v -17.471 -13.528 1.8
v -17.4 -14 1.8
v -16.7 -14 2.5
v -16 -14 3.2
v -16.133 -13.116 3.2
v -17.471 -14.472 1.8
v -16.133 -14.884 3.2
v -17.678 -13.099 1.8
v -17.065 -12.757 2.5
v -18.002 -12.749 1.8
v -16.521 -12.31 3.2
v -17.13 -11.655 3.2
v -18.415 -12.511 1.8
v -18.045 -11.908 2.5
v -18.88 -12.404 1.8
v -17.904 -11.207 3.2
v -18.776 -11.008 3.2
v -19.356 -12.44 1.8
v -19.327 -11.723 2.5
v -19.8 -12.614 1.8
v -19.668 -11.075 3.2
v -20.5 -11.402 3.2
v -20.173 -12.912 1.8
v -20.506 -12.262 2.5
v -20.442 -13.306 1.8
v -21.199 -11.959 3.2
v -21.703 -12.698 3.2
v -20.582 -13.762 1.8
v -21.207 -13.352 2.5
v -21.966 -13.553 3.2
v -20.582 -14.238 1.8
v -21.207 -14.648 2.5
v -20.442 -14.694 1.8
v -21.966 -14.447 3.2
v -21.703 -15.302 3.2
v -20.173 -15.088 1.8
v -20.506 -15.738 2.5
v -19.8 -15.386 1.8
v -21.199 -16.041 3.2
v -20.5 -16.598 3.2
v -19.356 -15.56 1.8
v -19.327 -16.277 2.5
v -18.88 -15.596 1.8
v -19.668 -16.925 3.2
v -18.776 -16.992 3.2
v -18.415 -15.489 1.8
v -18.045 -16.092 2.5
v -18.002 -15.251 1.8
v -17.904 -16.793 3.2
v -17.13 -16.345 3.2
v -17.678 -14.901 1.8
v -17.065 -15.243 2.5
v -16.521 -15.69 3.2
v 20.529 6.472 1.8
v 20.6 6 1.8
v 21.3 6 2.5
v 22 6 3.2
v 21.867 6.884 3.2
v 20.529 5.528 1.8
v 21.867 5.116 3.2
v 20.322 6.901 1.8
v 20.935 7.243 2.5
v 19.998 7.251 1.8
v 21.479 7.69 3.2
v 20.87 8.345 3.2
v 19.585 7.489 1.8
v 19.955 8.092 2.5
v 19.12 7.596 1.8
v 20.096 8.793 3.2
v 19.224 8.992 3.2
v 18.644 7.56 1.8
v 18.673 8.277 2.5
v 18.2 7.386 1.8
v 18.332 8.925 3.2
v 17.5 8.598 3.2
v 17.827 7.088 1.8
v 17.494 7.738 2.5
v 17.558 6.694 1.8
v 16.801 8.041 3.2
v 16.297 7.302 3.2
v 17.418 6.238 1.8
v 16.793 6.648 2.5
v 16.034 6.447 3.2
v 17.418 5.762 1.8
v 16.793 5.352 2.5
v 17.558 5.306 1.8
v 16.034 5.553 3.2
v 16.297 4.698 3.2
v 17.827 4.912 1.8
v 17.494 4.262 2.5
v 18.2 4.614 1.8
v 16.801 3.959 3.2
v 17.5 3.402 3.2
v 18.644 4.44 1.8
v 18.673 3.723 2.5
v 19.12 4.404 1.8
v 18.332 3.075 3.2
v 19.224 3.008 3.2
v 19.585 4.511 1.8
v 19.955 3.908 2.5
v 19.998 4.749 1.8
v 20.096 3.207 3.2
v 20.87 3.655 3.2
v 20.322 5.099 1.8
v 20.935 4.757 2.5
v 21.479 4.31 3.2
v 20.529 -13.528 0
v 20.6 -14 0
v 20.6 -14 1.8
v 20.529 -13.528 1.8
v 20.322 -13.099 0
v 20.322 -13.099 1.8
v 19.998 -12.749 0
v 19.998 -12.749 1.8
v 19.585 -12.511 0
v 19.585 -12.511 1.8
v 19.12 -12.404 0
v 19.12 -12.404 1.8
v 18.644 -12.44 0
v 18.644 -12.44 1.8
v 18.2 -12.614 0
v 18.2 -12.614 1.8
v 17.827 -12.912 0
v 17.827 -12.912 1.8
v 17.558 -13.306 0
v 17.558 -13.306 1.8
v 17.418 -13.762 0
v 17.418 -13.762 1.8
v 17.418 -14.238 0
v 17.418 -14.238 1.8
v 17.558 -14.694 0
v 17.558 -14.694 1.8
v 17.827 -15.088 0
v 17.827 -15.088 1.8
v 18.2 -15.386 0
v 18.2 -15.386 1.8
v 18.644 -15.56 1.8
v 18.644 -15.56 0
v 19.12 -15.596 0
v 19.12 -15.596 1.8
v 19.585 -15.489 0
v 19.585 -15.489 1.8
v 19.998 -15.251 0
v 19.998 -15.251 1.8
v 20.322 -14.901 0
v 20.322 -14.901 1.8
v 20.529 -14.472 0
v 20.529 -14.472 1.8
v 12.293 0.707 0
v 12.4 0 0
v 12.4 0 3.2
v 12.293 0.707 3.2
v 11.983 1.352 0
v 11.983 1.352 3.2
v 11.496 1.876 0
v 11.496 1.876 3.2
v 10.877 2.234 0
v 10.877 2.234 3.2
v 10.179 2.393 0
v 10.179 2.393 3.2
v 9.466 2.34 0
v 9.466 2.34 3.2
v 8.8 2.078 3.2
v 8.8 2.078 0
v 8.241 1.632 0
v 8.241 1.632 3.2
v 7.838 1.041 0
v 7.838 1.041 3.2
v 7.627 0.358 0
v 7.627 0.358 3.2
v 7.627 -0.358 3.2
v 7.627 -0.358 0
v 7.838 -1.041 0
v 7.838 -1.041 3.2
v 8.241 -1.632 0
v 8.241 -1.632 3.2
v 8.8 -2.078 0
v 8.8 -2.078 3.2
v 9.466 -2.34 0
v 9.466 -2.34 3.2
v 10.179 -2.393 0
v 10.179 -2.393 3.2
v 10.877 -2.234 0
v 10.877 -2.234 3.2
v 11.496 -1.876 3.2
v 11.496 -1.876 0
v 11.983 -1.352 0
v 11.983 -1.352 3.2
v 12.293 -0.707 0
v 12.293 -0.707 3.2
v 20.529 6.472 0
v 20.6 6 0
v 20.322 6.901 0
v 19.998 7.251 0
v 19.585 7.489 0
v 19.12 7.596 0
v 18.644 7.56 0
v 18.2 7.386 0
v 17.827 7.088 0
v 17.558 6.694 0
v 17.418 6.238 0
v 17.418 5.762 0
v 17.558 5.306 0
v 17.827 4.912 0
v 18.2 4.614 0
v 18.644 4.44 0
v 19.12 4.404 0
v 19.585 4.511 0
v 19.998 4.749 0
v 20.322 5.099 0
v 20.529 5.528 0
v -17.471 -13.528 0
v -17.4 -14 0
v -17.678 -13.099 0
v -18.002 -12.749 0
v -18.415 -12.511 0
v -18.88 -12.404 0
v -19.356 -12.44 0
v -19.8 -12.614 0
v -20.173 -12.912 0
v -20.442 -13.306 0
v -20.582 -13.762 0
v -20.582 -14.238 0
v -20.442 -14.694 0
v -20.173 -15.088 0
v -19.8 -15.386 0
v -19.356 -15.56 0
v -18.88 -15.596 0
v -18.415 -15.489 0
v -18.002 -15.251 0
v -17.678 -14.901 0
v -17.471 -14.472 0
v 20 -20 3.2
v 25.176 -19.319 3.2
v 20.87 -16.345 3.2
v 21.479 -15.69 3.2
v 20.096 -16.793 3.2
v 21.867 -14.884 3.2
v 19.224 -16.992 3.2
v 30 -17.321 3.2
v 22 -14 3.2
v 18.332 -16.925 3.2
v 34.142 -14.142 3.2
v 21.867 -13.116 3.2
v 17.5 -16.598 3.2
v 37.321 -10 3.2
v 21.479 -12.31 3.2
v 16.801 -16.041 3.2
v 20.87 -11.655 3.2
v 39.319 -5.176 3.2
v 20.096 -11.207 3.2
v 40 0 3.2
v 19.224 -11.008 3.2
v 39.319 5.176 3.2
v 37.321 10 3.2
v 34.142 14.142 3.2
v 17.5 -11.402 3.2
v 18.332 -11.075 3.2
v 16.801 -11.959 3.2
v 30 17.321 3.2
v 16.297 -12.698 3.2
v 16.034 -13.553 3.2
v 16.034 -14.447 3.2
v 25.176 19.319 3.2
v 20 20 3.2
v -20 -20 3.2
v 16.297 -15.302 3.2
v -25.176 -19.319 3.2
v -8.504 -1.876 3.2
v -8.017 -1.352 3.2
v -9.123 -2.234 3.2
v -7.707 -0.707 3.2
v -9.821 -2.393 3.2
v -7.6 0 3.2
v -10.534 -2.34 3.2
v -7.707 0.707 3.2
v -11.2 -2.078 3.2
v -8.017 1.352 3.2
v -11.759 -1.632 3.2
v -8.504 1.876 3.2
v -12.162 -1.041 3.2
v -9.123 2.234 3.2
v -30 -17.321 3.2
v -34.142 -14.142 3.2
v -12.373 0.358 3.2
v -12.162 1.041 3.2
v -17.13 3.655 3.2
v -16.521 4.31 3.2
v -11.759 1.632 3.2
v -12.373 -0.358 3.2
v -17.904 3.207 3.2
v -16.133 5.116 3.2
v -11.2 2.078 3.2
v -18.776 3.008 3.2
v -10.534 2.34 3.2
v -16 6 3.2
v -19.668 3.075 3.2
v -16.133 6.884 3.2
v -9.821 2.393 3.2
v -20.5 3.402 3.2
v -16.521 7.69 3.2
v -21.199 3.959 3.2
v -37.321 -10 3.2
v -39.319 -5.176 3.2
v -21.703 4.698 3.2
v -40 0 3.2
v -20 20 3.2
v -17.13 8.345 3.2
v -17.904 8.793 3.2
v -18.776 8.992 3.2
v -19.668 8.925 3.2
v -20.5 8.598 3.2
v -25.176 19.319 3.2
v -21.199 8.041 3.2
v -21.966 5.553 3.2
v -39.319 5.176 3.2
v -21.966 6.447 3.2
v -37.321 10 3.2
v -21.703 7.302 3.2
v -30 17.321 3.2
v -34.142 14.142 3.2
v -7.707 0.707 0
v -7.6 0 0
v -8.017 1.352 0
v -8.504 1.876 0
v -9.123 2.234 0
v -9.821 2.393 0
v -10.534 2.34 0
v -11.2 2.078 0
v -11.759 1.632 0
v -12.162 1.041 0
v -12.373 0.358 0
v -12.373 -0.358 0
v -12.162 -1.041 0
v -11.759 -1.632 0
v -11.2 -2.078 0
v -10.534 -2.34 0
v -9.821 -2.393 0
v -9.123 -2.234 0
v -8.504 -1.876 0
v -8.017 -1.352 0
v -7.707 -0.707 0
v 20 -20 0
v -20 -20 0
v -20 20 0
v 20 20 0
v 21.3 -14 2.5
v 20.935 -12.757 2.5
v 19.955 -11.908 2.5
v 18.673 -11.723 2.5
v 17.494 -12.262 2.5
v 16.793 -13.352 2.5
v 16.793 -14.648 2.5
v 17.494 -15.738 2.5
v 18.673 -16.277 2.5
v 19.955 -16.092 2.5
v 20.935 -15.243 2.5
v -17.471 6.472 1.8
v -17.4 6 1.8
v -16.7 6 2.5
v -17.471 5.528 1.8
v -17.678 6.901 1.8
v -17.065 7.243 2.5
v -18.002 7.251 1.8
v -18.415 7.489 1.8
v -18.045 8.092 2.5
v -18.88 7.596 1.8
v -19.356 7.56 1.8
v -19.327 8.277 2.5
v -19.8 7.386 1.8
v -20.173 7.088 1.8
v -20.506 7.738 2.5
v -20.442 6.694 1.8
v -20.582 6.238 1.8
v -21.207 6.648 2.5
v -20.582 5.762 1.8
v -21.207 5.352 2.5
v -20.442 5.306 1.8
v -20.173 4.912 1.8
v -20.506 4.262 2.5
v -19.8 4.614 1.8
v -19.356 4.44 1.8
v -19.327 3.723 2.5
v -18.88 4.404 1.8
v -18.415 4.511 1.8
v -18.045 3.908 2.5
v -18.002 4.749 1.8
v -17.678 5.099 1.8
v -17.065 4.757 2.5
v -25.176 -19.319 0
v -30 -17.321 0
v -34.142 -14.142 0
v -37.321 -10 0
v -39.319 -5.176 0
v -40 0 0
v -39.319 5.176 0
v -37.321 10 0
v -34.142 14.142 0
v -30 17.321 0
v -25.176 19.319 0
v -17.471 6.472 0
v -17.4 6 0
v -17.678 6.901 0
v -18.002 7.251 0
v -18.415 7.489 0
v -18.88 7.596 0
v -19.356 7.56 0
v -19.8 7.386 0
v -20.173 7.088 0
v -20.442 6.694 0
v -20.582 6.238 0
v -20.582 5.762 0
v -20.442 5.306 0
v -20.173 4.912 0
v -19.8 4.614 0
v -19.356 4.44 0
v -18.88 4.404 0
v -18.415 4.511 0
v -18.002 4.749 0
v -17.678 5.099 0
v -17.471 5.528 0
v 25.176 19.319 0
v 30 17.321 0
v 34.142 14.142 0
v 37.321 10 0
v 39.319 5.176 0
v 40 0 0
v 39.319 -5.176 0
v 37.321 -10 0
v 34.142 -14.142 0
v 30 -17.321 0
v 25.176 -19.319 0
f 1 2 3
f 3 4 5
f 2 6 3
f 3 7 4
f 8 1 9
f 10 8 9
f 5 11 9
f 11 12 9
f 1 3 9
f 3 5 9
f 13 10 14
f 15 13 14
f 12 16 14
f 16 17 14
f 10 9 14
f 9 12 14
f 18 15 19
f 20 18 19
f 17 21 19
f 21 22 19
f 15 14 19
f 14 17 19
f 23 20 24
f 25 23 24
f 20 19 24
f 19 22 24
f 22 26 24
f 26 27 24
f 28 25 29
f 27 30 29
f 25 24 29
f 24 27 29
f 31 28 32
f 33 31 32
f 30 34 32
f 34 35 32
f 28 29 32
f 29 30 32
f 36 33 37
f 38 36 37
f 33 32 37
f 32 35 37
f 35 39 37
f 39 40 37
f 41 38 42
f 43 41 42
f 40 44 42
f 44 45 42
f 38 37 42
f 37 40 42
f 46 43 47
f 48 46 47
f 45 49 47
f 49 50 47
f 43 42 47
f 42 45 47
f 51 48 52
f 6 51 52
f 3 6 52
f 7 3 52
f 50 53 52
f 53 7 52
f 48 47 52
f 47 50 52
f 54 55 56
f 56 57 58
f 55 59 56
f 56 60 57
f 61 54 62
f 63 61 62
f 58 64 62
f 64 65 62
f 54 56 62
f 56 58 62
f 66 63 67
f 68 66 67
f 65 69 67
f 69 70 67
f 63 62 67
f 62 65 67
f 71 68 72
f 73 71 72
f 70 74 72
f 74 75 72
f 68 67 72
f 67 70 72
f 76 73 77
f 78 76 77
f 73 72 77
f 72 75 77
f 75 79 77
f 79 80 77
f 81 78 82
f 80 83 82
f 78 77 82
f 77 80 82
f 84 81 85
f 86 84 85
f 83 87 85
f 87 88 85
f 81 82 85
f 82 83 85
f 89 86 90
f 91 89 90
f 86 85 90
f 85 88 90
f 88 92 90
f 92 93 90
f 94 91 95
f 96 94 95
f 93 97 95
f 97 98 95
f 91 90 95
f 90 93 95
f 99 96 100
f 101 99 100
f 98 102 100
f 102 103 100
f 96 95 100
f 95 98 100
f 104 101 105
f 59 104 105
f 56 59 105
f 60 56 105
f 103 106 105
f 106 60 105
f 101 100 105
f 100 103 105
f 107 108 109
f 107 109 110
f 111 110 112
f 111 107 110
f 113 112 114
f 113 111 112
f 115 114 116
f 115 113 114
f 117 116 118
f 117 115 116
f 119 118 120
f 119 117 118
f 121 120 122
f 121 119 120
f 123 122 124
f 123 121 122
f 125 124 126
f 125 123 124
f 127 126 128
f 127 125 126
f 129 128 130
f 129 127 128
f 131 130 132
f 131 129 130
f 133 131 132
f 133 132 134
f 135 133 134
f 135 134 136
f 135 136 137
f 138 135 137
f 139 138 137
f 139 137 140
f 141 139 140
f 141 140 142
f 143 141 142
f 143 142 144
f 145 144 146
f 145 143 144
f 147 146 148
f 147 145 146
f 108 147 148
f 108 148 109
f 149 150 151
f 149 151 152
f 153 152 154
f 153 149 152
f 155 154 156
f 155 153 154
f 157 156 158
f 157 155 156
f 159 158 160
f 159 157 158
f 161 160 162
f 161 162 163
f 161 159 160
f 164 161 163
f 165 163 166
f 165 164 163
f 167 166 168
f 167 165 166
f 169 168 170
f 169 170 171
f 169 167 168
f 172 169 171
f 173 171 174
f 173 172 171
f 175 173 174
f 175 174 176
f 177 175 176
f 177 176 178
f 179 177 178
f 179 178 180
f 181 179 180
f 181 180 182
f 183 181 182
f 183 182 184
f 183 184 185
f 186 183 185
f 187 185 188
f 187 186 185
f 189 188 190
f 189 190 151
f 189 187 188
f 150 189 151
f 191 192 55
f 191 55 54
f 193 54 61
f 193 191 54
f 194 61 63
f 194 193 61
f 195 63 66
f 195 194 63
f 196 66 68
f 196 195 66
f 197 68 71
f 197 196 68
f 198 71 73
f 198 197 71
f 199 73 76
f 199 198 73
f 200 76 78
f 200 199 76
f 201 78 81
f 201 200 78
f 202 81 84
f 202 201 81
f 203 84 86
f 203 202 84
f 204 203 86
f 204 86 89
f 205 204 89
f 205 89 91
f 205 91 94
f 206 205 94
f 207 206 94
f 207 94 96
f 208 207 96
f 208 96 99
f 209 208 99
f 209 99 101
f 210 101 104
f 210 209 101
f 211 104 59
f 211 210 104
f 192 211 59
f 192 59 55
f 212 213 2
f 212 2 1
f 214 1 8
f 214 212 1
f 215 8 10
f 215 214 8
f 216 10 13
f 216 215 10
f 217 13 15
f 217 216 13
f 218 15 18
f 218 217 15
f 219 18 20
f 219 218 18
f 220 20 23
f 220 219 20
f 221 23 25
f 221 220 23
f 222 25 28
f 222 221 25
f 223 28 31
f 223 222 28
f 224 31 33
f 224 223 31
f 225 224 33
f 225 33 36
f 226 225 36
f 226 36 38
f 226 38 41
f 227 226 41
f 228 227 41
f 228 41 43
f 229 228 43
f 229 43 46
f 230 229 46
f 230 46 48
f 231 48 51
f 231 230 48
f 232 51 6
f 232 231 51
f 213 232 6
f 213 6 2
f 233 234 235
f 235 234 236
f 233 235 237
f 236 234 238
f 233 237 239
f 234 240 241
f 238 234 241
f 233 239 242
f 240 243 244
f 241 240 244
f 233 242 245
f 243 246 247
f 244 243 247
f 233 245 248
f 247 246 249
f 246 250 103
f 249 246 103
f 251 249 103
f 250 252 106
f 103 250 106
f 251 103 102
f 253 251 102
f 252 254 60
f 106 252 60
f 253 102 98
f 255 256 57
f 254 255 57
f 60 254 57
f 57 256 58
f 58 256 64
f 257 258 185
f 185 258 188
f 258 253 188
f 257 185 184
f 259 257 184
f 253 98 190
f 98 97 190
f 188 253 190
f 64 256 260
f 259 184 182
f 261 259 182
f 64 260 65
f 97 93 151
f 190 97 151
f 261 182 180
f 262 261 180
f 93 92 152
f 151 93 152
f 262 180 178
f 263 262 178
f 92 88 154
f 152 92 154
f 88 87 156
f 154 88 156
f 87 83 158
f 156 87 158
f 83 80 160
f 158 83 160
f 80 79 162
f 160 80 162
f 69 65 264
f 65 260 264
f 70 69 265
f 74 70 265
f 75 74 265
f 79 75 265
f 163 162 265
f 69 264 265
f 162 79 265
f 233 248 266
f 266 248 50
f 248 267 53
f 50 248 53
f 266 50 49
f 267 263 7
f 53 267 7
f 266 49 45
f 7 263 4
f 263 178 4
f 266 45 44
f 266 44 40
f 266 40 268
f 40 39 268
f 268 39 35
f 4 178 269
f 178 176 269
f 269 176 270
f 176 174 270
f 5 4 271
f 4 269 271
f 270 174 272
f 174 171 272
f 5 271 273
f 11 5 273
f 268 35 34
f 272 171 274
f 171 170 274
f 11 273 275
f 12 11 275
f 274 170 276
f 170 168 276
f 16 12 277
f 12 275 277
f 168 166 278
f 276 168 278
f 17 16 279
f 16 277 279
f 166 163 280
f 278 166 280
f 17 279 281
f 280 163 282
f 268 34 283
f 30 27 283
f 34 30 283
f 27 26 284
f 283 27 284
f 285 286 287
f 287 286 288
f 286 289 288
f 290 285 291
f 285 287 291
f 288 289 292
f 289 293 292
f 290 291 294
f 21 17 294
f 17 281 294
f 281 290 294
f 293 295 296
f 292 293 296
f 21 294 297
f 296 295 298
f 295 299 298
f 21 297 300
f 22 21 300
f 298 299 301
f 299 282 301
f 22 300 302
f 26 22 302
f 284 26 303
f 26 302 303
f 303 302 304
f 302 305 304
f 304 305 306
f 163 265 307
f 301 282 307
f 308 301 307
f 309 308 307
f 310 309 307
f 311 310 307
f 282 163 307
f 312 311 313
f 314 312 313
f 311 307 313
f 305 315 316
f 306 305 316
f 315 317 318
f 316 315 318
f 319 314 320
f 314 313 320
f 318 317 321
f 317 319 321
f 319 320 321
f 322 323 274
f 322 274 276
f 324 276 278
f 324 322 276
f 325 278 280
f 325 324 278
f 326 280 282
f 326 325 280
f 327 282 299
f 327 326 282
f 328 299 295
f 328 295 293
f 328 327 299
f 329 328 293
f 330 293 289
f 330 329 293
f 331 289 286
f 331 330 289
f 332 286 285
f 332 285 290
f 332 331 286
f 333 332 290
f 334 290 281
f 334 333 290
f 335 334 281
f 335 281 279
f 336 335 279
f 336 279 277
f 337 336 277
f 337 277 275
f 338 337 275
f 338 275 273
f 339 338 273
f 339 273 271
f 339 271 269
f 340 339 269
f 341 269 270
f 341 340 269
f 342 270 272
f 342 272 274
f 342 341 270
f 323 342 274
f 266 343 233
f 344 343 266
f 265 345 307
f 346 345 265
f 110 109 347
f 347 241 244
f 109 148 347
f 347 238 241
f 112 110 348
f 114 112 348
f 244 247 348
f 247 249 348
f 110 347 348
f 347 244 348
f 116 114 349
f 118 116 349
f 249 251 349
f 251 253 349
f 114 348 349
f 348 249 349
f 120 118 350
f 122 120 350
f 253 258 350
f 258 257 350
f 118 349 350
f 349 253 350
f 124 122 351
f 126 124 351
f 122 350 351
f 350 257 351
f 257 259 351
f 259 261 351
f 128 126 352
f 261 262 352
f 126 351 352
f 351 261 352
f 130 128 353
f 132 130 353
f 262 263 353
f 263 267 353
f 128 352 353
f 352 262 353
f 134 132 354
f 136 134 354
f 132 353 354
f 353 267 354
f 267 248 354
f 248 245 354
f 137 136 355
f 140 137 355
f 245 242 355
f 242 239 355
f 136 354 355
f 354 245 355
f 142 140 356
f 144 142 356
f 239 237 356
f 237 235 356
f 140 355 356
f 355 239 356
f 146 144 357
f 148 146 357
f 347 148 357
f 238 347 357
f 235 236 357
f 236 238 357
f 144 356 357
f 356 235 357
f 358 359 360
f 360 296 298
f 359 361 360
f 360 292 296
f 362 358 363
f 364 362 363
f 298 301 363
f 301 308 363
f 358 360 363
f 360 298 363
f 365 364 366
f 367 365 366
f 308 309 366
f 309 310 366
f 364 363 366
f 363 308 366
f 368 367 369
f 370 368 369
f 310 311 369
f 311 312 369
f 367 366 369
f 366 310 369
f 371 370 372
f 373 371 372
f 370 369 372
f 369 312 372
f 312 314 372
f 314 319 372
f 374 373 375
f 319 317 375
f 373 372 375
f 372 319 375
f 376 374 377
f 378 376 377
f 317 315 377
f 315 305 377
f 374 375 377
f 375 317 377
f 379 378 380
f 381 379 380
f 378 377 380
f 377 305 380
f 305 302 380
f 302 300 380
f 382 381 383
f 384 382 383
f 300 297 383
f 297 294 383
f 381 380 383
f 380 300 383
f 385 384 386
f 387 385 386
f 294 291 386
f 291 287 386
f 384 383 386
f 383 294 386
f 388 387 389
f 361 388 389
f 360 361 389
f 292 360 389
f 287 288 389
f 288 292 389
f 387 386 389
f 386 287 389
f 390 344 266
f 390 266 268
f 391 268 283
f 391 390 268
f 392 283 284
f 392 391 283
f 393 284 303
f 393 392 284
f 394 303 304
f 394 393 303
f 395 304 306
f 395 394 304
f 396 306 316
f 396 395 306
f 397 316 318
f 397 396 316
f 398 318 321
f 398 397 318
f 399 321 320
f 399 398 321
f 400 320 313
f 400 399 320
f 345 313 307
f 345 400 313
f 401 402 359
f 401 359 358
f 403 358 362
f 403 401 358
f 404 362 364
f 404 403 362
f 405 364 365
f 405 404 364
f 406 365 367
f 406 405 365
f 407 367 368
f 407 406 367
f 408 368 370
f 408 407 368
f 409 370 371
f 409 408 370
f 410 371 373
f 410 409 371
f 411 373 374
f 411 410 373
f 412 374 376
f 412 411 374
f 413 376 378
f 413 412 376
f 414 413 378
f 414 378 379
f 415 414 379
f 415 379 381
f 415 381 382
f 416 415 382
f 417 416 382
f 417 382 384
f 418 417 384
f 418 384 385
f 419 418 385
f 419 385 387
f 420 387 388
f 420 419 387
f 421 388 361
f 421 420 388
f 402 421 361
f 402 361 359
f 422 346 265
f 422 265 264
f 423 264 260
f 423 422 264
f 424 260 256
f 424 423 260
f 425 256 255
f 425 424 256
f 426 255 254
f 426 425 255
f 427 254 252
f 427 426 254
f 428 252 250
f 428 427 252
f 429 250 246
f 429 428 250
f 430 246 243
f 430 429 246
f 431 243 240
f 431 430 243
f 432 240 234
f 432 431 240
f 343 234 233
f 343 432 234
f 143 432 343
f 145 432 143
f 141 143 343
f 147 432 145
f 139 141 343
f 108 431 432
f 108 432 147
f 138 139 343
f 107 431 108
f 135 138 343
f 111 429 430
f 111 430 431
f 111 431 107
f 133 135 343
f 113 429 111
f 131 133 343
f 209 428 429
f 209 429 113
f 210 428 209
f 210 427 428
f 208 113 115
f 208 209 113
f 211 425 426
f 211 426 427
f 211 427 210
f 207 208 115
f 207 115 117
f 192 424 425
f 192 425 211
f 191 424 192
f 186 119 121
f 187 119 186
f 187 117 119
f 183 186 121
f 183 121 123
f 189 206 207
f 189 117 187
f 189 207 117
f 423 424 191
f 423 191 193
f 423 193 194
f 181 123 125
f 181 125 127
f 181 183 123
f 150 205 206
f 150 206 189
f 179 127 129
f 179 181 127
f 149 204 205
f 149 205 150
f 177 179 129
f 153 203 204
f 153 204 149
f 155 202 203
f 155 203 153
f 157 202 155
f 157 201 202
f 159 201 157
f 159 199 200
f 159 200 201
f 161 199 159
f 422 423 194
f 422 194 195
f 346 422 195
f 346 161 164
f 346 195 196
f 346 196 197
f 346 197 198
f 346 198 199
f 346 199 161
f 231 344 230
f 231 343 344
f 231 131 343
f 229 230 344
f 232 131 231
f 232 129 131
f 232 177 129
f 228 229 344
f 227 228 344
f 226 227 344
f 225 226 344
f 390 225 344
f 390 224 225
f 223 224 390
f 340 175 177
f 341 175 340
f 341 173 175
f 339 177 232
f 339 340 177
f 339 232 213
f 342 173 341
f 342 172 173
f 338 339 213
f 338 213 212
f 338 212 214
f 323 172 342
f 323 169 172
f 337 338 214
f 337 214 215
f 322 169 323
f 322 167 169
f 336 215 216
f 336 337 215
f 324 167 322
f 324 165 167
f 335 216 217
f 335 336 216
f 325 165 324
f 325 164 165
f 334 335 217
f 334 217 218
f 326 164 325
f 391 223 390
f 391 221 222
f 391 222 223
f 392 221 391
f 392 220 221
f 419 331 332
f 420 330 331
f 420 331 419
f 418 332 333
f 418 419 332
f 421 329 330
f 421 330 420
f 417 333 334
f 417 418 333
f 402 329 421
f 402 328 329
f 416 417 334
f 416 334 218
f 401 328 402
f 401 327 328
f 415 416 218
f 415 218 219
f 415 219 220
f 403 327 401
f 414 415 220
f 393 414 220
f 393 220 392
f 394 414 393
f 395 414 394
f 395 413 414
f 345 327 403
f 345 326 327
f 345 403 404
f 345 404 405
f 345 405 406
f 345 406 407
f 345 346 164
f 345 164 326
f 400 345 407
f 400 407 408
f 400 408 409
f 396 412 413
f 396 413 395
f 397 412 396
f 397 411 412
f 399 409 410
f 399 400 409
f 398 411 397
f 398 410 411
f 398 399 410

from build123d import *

# Parameters (mm, degrees)
SKETCH_1_R      = 1.6
SKETCH_1_R_2    = 2.4
EXTRUDE_1_DEPTH = 3.2
CHAMFER_1_SIZE  = 1.4


with BuildPart() as part:
    # 草图1 → 凸台-拉伸1 (new body)
    with BuildSketch(Plane.XY):
        with BuildLine():
            Line((-20, 20), (20, 20))
            ThreePointArc((20, 20), (40, 0), (20, -20))
            Line((20, -20), (-20, -20))
            ThreePointArc((-20, -20), (-40, 0), (-20, 20))
        make_face()
        with Locations((-19, -14)):
            Circle(SKETCH_1_R, mode=Mode.SUBTRACT)
        with Locations((19, -14)):
            Circle(SKETCH_1_R, mode=Mode.SUBTRACT)
        with Locations((19, 6)):
            Circle(SKETCH_1_R, mode=Mode.SUBTRACT)
        with Locations((-19, 6)):
            Circle(SKETCH_1_R, mode=Mode.SUBTRACT)
        with Locations((-10, 0)):
            Circle(SKETCH_1_R_2, mode=Mode.SUBTRACT)
        with Locations((10, 0)):
            Circle(SKETCH_1_R_2, mode=Mode.SUBTRACT)
    extrude(amount=EXTRUDE_1_DEPTH)

    # 倒角1
    chamfer_1_edges = [part.edges().sort_by_distance(p)[0] for p in [
        (-20.6, -14, 3.2),
        (17.4, -14, 3.2),
        (17.4, 6, 3.2),
        (-20.6, 6, 3.2),
    ]]
    chamfer(chamfer_1_edges, length=CHAMFER_1_SIZE)


solid = part.part
